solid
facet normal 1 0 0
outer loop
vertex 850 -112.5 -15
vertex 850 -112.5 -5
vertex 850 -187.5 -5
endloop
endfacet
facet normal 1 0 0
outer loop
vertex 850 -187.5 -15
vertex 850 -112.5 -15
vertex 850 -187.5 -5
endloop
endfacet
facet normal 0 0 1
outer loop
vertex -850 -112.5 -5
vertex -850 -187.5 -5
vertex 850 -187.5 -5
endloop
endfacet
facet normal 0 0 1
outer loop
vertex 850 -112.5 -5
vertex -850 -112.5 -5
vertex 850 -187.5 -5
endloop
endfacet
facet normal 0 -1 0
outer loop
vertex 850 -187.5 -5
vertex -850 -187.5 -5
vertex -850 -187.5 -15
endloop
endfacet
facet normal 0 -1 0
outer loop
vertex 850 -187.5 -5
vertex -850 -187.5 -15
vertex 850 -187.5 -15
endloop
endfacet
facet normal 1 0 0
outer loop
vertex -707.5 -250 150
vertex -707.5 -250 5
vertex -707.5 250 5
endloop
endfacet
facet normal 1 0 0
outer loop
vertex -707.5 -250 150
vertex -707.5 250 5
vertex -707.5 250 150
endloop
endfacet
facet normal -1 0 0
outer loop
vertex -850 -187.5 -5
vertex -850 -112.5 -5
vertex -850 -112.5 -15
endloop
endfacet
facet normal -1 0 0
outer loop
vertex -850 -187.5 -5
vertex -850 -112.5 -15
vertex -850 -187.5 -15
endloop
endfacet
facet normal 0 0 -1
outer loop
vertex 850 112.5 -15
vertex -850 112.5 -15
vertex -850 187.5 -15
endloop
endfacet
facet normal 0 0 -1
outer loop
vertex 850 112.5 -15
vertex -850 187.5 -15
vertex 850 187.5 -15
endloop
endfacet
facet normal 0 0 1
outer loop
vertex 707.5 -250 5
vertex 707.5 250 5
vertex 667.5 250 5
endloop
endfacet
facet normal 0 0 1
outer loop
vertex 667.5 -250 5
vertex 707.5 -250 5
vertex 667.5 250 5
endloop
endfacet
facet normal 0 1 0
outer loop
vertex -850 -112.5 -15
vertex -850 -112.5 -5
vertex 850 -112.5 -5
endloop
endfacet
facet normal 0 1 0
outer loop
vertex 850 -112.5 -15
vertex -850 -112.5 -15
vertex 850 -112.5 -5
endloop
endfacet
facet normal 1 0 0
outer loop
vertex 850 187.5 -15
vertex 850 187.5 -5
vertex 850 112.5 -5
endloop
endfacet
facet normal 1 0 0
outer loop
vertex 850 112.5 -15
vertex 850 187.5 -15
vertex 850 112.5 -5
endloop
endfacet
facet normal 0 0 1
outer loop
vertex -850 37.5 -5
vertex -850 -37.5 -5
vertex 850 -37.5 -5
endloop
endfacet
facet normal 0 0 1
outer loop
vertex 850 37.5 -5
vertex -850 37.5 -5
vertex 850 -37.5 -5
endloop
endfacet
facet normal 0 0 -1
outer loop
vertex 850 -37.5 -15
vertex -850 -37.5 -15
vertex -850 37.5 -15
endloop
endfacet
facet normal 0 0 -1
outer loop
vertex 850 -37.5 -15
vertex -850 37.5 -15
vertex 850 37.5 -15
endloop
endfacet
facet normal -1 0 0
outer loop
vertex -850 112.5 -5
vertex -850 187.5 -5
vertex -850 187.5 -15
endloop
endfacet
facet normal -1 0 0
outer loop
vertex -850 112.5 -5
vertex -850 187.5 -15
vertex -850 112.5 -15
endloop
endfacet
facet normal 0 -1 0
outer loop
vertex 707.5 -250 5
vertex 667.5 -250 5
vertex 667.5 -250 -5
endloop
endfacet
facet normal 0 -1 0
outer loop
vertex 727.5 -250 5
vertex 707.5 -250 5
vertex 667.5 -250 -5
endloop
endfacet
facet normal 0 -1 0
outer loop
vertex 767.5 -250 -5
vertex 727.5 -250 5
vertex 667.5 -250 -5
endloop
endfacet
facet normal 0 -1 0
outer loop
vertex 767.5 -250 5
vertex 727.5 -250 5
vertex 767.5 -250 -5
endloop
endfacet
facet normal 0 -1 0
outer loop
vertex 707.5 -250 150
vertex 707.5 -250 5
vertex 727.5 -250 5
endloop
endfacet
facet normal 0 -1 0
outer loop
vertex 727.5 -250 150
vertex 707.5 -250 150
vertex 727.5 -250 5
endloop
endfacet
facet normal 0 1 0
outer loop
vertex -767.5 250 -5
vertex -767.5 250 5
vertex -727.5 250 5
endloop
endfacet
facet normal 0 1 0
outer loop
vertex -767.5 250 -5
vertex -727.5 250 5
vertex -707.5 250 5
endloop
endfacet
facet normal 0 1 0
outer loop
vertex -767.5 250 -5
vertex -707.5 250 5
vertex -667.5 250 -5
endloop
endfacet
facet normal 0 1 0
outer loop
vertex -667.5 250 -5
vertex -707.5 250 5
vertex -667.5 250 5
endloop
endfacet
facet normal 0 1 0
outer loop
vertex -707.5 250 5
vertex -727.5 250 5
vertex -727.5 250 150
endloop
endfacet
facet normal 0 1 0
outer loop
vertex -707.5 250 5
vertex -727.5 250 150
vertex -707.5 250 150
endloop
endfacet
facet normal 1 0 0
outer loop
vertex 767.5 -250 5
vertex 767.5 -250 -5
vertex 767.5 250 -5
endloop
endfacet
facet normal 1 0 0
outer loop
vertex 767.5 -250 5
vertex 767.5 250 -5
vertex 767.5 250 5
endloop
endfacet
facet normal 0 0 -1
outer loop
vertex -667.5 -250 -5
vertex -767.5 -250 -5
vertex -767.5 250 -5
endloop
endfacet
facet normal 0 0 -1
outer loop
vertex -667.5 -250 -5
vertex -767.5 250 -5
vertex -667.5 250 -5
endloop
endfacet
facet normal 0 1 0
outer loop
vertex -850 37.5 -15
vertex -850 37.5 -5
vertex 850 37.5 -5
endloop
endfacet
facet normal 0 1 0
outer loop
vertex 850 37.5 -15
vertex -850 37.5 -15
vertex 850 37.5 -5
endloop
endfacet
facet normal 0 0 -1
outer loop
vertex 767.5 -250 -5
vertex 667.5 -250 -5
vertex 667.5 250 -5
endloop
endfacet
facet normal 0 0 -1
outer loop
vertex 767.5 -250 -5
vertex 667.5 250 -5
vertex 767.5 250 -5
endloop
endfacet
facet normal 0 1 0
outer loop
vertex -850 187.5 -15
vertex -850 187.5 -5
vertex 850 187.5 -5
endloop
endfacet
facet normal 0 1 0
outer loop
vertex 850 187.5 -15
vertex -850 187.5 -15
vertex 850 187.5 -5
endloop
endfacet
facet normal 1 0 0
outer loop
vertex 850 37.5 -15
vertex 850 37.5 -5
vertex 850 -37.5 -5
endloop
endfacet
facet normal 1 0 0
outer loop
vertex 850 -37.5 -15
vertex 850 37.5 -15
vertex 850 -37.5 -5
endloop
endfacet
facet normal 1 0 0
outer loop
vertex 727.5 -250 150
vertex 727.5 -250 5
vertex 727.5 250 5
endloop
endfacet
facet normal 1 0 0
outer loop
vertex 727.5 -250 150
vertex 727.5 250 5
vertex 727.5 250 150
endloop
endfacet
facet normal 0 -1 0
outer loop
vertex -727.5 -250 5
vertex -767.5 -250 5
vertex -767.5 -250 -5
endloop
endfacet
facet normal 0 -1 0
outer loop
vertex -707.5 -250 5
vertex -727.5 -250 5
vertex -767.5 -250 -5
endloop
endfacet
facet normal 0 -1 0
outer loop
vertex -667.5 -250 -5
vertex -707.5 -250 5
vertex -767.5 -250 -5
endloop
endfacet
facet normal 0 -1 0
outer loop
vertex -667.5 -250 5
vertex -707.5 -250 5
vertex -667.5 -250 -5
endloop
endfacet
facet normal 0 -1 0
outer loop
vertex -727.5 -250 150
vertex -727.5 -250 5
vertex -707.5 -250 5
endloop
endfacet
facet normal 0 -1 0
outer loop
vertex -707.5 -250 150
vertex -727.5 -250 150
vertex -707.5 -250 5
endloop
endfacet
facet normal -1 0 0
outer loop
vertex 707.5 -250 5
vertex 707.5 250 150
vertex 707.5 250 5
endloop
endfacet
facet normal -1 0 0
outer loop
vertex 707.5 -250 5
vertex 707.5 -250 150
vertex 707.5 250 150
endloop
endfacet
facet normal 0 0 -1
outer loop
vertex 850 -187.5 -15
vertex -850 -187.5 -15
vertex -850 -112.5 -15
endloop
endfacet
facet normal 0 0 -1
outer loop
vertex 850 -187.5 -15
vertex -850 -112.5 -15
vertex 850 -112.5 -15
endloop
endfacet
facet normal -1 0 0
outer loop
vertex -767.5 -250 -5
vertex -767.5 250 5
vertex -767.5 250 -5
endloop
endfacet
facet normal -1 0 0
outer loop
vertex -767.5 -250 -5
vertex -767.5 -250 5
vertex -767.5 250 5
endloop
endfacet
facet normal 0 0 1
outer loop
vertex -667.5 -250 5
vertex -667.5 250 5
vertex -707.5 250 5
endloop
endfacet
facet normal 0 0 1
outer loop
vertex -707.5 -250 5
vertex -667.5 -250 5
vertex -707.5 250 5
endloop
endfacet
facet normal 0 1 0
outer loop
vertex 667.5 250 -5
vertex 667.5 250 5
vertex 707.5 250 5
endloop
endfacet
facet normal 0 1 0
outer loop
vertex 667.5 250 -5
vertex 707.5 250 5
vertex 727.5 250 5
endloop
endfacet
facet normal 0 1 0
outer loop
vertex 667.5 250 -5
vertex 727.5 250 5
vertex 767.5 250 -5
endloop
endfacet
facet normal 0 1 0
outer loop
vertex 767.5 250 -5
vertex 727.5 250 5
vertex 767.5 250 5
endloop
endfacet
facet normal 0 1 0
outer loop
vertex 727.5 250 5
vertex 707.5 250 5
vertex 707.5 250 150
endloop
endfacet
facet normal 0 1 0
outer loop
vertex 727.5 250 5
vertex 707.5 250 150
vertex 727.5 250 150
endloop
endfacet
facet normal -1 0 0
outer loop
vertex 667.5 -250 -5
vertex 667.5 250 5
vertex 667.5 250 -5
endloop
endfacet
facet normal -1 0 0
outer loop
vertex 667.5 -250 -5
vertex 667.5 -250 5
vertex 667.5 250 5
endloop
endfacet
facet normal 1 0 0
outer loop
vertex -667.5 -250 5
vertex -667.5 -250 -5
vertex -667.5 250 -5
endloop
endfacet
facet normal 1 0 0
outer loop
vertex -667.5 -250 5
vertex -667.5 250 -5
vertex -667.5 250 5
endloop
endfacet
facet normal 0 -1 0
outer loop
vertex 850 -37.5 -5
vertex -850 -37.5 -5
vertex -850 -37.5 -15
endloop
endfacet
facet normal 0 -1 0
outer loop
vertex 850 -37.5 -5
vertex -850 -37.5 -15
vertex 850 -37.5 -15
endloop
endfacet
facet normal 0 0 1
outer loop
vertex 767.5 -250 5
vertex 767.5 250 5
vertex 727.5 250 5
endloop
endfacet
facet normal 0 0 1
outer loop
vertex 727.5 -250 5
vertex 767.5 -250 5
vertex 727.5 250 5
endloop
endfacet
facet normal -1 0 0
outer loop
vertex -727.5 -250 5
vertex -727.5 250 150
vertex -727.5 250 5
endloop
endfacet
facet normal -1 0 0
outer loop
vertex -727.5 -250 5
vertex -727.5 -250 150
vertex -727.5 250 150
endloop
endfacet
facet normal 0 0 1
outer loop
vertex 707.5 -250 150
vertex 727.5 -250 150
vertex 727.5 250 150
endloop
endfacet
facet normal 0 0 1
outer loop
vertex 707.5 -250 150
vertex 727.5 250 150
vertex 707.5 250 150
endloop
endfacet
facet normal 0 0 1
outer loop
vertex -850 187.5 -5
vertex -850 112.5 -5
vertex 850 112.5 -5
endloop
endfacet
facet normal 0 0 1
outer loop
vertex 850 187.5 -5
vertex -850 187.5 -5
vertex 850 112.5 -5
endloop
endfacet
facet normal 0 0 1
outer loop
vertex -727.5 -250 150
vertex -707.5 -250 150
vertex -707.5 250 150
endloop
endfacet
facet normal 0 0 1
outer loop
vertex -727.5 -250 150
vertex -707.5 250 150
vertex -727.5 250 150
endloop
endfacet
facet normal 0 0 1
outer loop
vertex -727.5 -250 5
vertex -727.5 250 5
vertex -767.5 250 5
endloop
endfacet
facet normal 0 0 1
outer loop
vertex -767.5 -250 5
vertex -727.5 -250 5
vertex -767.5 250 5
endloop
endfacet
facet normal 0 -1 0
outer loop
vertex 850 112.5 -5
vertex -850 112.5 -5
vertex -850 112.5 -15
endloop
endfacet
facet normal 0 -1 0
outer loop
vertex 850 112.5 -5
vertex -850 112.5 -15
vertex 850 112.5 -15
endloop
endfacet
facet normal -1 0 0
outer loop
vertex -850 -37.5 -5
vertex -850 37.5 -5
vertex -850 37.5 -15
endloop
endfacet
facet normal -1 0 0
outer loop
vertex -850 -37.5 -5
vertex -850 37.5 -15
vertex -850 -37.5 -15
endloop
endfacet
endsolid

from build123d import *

# Parameters (mm, degrees)
F1_DEPTH = 250
F2_W     = 1700
F2_H     = 75
F3_DEPTH = 10


with BuildPart() as f1:
    # F0 (on Front) → F1 (new body, symmetric)
    with BuildSketch(Plane.XZ):
        Polygon((-727.5, 5), (-767.5, 5), (-767.5, -5), (-667.5, -5), (-667.5, 5), (-707.5, 5), align=None)
        Polygon((-727.5, 150), (-727.5, 5), (-707.5, 5), (-707.5, 150), (-717.5, 150), align=None)
    extrude(amount=F1_DEPTH, both=True)


with BuildPart() as f1b:
    # F0 (on Front) → F1, piece 2 (new body, symmetric)
    with BuildSketch(Plane.XZ):
        Polygon((707.5, 5), (667.5, 5), (667.5, -5), (767.5, -5), (767.5, 5), (727.5, 5), align=None)
        Polygon((707.5, 150), (707.5, 5), (727.5, 5), (727.5, 150), (717.5, 150), align=None)
    extrude(amount=F1_DEPTH, both=True)


with BuildPart() as f3:
    # F2 (on face) → F3 (new body)
    with BuildSketch(Plane(origin=(0, 0, -5), x_dir=(1, 0, 0), z_dir=(0, 0, -1))):
        Rectangle(F2_W, F2_H)
    extrude(amount=F3_DEPTH)


with BuildPart() as f3b:
    # F2 (on face) → F3, piece 2 (new body)
    with BuildSketch(Plane(origin=(0, 0, -5), x_dir=(1, 0, 0), z_dir=(0, 0, -1))):
        with Locations((0, 150)):
            Rectangle(F2_W, F2_H)
    extrude(amount=F3_DEPTH)


with BuildPart() as f3c:
    # F2 (on face) → F3, piece 3 (new body)
    with BuildSketch(Plane(origin=(0, 0, -5), x_dir=(1, 0, 0), z_dir=(0, 0, -1))):
        with Locations((0, -150)):
            Rectangle(F2_W, F2_H)
    extrude(amount=F3_DEPTH)


solid = Compound([f1.part, f1b.part, f3.part, f3b.part, f3c.part])
